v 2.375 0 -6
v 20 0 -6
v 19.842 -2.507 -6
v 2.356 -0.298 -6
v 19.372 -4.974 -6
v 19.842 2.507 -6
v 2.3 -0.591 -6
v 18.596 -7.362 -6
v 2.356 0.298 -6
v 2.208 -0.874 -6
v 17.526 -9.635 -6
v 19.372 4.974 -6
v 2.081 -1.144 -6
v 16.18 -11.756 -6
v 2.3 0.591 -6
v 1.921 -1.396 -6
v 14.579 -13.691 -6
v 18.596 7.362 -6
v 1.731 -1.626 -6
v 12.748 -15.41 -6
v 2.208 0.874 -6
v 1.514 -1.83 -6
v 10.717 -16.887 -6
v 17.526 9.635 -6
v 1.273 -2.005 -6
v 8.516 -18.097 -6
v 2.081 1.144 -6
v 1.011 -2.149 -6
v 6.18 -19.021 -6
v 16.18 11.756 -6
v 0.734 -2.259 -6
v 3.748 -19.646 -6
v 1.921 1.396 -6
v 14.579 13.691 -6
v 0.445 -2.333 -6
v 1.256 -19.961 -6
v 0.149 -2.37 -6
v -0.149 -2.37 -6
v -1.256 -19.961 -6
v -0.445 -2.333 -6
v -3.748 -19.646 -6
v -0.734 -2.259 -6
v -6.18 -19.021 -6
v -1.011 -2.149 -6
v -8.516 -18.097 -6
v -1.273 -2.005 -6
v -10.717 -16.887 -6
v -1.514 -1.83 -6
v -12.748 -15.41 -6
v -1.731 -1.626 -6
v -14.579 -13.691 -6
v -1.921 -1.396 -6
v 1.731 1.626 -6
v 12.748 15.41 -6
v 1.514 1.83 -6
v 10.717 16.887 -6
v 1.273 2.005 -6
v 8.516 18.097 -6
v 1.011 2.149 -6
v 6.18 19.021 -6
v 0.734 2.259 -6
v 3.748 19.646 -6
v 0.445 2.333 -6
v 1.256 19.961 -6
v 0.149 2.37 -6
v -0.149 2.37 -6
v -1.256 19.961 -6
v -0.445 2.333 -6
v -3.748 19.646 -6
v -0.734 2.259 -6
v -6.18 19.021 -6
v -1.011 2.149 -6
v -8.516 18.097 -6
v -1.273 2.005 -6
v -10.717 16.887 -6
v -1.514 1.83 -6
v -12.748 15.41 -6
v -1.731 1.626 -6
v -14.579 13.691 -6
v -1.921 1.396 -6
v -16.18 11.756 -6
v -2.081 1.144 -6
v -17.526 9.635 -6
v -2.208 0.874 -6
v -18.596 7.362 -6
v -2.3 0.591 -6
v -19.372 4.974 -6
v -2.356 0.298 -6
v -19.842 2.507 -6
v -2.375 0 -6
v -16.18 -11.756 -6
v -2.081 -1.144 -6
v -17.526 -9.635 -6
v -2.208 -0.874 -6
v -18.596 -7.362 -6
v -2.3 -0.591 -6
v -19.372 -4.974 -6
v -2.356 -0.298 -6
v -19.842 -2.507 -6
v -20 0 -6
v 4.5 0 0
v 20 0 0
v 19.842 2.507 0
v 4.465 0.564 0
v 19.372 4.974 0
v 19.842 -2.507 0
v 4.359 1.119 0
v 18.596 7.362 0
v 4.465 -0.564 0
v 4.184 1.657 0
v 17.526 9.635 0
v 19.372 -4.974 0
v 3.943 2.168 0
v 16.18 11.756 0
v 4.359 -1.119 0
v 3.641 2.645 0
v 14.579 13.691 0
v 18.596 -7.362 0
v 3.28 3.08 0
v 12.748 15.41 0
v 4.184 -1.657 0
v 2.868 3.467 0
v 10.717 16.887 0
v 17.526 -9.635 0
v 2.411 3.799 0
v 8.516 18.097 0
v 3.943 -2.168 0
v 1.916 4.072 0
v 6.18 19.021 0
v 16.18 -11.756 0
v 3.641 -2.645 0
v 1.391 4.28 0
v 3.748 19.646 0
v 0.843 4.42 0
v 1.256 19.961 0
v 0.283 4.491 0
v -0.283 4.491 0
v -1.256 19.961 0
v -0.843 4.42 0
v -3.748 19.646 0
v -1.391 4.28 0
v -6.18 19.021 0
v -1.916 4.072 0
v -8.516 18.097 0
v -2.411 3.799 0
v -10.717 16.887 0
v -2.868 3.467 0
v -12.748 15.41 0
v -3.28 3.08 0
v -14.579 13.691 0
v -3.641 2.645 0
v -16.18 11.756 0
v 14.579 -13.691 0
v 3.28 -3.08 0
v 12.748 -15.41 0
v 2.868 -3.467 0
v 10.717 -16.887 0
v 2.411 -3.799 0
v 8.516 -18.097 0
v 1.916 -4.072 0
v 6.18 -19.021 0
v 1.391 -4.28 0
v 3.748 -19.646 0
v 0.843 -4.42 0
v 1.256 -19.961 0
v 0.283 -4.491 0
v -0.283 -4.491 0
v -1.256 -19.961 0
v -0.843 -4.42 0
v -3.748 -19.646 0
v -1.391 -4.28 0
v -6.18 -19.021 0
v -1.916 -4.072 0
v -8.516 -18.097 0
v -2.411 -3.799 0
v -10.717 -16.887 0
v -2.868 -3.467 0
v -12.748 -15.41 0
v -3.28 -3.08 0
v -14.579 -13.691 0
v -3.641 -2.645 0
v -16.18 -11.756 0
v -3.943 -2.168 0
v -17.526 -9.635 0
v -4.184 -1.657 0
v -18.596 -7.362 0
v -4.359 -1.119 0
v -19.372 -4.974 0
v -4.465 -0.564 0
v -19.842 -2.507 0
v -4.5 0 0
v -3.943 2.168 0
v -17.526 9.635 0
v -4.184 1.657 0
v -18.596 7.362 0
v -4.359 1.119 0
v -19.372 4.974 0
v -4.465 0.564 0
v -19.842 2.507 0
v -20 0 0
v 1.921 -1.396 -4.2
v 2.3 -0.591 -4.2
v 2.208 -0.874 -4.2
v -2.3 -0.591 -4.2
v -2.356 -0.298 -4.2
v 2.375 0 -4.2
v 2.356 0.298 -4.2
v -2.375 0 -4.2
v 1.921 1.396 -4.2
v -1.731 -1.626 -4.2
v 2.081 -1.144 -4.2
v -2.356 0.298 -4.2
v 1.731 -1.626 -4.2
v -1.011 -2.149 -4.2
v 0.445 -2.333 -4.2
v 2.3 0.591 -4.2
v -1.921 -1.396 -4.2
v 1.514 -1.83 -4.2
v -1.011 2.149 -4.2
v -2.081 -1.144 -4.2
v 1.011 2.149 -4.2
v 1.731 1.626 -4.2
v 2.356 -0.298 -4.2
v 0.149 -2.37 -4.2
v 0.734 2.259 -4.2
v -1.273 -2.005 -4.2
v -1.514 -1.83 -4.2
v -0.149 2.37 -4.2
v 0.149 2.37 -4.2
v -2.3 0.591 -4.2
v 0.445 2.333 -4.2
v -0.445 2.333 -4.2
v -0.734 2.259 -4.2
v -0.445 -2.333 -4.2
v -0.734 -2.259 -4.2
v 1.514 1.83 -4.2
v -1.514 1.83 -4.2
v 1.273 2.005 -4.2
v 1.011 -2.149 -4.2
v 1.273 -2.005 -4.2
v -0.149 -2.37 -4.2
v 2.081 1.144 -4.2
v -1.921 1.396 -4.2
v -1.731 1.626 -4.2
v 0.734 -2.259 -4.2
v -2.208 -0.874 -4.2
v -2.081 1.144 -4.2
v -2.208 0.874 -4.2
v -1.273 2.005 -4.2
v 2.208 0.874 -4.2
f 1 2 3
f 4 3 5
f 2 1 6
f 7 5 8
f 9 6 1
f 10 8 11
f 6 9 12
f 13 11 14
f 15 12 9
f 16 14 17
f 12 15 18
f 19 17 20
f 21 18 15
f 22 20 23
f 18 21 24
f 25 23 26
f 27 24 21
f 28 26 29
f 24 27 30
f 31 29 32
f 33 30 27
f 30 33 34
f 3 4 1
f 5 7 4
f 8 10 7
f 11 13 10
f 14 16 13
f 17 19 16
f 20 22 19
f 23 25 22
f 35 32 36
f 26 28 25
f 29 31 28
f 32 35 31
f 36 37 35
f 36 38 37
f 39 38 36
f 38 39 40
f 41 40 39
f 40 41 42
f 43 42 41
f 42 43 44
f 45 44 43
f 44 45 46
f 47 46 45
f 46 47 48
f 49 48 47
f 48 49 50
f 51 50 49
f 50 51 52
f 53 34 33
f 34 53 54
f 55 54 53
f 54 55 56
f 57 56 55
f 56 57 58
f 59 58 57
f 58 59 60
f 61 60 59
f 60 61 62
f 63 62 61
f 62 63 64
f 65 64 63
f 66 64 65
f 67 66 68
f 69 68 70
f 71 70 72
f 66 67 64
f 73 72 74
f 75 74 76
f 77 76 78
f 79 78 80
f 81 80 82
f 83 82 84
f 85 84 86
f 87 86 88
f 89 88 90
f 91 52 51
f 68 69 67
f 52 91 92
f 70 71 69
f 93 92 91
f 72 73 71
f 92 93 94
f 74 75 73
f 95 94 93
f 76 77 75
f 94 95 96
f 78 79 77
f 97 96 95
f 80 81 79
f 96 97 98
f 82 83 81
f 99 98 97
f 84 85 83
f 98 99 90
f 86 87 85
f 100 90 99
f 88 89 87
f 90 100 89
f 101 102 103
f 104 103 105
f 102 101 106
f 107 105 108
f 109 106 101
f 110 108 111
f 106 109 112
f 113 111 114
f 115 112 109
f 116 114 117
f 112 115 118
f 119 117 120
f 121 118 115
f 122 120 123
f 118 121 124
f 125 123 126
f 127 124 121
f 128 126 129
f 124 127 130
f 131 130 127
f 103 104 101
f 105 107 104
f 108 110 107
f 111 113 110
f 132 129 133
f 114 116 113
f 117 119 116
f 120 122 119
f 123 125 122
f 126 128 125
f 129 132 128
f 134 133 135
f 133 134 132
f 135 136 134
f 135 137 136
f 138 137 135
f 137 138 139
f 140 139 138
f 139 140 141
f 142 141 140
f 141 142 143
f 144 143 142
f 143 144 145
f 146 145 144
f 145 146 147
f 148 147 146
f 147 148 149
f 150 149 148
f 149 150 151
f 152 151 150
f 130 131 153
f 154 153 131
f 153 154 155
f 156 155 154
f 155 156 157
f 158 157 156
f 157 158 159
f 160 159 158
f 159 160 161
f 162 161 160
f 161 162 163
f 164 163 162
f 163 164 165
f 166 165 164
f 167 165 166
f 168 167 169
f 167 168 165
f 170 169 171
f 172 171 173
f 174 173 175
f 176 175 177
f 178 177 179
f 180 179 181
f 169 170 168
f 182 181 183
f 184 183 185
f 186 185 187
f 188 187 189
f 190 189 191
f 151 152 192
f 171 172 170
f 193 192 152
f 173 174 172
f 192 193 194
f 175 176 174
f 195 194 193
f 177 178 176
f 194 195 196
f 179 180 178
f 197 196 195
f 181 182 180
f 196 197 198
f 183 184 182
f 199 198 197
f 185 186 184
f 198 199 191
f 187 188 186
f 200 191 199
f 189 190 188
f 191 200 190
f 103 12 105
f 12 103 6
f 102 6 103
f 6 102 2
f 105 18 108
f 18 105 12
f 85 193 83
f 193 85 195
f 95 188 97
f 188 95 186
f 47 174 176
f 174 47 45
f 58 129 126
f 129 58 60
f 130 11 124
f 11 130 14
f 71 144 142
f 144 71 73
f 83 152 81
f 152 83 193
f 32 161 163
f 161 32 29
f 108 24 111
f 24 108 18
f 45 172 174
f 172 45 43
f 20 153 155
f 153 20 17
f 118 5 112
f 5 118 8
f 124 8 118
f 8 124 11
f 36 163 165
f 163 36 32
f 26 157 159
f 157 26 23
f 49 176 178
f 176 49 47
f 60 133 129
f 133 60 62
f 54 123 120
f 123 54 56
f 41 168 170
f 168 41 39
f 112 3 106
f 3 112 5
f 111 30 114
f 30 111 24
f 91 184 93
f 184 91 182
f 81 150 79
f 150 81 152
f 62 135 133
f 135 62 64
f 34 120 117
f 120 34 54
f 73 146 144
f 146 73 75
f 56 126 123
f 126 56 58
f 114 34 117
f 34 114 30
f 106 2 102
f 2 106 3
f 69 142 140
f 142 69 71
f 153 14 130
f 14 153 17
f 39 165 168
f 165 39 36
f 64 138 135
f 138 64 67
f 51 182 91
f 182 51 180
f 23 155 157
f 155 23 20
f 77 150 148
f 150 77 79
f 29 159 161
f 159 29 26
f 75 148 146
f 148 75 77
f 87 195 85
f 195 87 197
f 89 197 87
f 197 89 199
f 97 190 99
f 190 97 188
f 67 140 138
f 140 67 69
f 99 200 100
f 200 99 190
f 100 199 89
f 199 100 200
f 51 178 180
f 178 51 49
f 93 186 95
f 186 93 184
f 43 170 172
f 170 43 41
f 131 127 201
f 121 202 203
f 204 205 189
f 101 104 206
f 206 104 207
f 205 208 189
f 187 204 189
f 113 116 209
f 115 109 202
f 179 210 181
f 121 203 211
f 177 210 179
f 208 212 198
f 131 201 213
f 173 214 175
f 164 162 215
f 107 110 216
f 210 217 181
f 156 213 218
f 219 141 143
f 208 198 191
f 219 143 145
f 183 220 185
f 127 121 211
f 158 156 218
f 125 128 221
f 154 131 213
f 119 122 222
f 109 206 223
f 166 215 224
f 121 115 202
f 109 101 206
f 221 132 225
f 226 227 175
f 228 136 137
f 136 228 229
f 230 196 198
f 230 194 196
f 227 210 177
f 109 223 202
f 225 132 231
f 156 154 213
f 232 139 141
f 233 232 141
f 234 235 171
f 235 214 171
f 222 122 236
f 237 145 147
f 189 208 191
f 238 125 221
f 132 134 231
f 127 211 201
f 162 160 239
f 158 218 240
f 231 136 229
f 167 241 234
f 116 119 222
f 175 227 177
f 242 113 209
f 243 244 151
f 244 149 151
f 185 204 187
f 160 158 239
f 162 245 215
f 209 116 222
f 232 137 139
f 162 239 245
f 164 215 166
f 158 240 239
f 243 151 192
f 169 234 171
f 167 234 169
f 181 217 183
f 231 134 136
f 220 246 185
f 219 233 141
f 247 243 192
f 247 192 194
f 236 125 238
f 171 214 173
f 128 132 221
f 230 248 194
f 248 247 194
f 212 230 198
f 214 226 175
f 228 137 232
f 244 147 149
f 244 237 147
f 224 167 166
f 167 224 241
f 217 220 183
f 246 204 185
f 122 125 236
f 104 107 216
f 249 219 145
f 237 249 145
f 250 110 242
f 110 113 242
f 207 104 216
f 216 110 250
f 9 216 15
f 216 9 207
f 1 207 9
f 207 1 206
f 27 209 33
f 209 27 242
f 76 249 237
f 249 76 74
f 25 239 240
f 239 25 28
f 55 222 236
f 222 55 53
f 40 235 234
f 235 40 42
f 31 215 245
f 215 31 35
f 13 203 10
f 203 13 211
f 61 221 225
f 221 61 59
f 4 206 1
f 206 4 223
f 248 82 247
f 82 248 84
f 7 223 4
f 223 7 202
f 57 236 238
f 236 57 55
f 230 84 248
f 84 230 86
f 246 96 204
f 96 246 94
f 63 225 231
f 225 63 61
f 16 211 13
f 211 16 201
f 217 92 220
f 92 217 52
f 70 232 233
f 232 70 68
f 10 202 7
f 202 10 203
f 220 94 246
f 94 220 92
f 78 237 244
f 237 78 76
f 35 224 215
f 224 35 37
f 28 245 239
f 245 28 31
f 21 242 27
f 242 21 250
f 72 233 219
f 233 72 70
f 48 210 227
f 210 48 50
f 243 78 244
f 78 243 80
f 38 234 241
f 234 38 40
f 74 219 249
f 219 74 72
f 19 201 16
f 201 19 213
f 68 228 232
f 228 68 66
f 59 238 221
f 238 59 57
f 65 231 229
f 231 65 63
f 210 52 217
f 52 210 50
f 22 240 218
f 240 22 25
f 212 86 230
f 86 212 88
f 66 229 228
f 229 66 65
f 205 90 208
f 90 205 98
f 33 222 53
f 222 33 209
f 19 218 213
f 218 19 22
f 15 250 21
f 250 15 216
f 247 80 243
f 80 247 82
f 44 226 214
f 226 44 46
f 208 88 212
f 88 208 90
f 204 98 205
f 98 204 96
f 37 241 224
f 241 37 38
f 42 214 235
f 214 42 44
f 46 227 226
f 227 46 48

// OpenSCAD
$fn = 50;


difference() {
	union() {
		translate(v = [0, 0, -6.0000000000]) {
			cylinder(h = 6, r = 10.0000000000);
		}
		translate(v = [0, 0, -6.0000000000]) {
			cylinder(h = 6, r = 20.0000000000);
		}
	}
	union() {
		translate(v = [0, 0, 0]) {
			rotate(a = [0, 0, 0]) {
				difference() {
					union() {
						#translate(v = [0, 0, -6.0000000000]) {
							cylinder(h = 6, r = 2.2500000000);
						}
						#translate(v = [0, 0, -4.2000000000]) {
							cylinder(h = 4.2000000000, r1 = 2.3750000000, r2 = 4.5000000000);
						}
						#translate(v = [0, 0, -6.0000000000]) {
							cylinder(h = 6, r = 2.3750000000);
						}
						#translate(v = [0, 0, -6.0000000000]) {
							cylinder(h = 6, r = 2.2500000000);
						}
					}
					union();
				}
			}
		}
	}
}
